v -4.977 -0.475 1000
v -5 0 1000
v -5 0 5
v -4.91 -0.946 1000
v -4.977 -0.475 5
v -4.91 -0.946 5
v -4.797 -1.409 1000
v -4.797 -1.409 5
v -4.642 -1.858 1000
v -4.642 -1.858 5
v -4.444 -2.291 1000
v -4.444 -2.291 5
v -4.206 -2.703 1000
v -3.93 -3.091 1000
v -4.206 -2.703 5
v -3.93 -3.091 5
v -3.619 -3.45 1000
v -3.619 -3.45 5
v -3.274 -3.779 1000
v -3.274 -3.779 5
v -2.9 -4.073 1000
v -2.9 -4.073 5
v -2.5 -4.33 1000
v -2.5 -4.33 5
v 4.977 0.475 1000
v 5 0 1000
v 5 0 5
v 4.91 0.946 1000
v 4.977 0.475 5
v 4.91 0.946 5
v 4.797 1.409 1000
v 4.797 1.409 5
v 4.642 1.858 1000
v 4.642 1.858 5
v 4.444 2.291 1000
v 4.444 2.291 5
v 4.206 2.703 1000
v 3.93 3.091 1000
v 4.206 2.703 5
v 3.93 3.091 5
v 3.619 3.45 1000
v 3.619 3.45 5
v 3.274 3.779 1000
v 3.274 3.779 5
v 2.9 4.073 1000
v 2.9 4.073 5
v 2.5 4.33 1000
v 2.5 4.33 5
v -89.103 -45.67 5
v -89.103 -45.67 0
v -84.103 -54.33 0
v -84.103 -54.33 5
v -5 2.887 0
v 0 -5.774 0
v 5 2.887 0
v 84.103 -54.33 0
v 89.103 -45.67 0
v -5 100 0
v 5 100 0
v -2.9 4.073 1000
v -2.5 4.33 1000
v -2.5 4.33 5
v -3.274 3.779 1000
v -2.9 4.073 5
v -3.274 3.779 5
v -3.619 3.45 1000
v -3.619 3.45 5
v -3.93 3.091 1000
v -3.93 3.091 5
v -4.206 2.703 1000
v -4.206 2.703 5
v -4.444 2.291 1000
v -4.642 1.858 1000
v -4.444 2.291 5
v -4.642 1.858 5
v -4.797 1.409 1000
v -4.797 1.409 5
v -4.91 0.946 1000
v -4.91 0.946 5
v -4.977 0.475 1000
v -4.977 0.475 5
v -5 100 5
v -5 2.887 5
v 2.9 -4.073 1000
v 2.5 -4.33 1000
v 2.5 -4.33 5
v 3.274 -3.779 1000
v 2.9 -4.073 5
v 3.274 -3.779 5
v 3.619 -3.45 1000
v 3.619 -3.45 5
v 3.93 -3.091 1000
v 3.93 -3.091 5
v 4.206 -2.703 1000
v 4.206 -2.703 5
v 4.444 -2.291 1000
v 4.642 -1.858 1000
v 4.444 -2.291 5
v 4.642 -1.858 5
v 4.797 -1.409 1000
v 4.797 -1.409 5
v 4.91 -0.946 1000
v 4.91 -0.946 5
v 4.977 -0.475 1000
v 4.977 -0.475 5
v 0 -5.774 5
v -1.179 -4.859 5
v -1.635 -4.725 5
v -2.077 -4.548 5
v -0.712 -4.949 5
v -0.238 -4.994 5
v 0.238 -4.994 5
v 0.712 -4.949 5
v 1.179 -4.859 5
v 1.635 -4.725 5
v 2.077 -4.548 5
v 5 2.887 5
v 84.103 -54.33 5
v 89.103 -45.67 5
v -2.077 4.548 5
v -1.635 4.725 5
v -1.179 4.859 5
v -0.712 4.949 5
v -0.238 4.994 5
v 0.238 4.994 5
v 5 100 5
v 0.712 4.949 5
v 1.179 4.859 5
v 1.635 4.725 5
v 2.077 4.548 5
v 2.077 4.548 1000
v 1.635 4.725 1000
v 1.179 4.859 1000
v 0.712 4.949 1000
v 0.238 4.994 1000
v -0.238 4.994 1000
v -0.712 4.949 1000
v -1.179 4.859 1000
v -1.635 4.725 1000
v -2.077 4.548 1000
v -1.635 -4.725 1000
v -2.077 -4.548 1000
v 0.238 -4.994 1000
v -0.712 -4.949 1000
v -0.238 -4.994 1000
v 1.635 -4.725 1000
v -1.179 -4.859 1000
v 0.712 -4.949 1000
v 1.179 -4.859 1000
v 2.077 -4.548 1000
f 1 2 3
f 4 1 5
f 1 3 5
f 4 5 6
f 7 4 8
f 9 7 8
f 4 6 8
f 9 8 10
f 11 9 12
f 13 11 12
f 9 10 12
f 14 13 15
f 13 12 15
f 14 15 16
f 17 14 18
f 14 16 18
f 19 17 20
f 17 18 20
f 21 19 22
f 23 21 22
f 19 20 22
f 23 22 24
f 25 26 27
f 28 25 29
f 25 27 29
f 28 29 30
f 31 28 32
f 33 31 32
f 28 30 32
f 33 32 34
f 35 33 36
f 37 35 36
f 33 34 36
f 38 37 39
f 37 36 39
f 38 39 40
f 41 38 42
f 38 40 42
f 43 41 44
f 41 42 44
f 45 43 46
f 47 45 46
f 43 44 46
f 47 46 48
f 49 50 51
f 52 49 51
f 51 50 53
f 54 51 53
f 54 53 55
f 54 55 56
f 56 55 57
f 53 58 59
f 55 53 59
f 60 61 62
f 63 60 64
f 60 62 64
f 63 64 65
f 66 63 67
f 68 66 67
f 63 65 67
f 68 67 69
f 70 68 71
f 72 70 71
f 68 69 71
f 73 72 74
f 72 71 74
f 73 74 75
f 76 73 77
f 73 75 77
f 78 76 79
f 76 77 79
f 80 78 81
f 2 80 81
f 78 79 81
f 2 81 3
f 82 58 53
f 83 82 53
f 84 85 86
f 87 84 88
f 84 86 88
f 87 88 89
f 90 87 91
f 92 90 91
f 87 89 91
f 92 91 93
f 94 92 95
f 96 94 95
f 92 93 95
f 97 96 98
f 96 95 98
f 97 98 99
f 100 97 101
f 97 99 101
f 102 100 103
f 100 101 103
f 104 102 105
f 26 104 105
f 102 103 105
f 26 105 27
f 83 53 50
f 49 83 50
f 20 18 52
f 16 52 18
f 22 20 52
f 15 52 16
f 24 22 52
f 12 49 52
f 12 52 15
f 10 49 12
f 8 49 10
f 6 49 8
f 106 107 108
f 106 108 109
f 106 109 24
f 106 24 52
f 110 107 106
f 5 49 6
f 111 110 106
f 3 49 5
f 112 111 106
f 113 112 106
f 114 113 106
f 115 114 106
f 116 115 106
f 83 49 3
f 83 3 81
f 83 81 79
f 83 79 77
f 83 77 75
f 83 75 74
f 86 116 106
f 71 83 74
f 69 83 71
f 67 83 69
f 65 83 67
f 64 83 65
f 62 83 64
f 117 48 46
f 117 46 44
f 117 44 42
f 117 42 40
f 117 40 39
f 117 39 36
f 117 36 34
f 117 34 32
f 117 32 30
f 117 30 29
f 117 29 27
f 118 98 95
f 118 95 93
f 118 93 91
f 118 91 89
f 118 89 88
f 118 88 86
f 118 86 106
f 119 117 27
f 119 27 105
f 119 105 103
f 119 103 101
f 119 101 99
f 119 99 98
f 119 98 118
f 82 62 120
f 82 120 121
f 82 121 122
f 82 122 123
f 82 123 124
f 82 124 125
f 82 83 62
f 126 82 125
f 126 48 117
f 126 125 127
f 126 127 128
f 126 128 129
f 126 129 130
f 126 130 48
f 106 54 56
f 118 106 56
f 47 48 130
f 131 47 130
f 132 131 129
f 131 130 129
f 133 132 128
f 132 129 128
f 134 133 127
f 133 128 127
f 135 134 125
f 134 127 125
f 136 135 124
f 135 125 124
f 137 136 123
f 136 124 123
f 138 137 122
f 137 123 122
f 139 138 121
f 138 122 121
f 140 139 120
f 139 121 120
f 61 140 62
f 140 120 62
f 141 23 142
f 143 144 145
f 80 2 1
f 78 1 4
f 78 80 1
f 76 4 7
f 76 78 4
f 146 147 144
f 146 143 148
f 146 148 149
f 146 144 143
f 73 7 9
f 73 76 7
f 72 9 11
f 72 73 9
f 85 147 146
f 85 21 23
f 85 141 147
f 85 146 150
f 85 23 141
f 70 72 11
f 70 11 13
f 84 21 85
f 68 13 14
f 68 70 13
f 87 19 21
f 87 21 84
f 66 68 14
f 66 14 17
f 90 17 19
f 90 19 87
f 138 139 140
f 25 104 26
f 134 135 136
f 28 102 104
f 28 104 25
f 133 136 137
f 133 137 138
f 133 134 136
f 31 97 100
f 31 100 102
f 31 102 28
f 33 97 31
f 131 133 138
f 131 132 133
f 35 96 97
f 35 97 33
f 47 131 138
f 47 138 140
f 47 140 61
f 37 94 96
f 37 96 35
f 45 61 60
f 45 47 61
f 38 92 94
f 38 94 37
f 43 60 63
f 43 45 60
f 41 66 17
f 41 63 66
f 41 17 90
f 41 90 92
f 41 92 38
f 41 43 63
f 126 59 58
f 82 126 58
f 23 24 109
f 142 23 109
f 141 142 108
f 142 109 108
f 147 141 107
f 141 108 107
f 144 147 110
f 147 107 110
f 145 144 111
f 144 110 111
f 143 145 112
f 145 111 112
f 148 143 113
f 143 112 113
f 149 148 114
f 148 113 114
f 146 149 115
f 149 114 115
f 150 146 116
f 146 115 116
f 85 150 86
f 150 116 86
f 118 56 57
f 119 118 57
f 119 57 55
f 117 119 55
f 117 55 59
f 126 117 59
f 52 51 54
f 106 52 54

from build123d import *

# Parameters (mm, degrees)
F1_DEPTH = 5
F2_DEPTH = 1000


with BuildPart() as f1:
    # F0 (on Top) → F1 (new body)
    with BuildSketch(Plane.XY):
        with BuildLine():
            Line((-5, 100), (-5, 2.8867513459))
            Line((-5, 2.8867513459), (-2.5, 4.3301270189))
            ThreePointArc((-2.5, 4.3301270189), (0, 5), (2.5, 4.3301270189))
            Line((2.5, 4.3301270189), (5, 2.8867513459))
            Line((5, 2.8867513459), (5, 100))
            Line((5, 100), (-5, 100))
        make_face()
        with BuildLine():
            Line((-2.5, 4.3301270189), (-5, 2.8867513459))
            Line((-5, 2.8867513459), (-5, 0))
            ThreePointArc((-5, 0), (-4.3301270189, 2.5), (-2.5, 4.3301270189))
        make_face()
        with BuildLine():
            Line((-89.1025403784, -45.6698729811), (-86.6025403784, -50))
            Line((-86.6025403784, -50), (-84.1025403784, -54.3301270189))
            Line((-84.1025403784, -54.3301270189), (0, -5.7735026919))
            Line((0, -5.7735026919), (-2.5, -4.3301270189))
            ThreePointArc((-2.5, -4.3301270189), (-4.3301270189, -2.5), (-5, 0))
            Line((-5, 0), (-5, 2.8867513459))
            Line((-5, 2.8867513459), (-89.1025403784, -45.6698729811))
        make_face()
        with BuildLine():
            Line((-2.5, -4.3301270189), (0, -5.7735026919))
            Line((0, -5.7735026919), (2.5, -4.3301270189))
            ThreePointArc((2.5, -4.3301270189), (0, -5), (-2.5, -4.3301270189))
        make_face()
        with BuildLine():
            Line((2.5, -4.3301270189), (0, -5.7735026919))
            Line((0, -5.7735026919), (84.1025403784, -54.3301270189))
            Line((84.1025403784, -54.3301270189), (86.6025403784, -50))
            Line((86.6025403784, -50), (89.1025403784, -45.6698729811))
            Line((89.1025403784, -45.6698729811), (5, 2.8867513459))
            Line((5, 2.8867513459), (5, 0))
            ThreePointArc((5, 0), (4.3301270189, -2.5), (2.5, -4.3301270189))
        make_face()
        with BuildLine():
            Line((5, 2.8867513459), (2.5, 4.3301270189))
            ThreePointArc((2.5, 4.3301270189), (4.3301270189, 2.5), (5, 0))
            Line((5, 0), (5, 2.8867513459))
        make_face()
    extrude(amount=F1_DEPTH)

    # F0 (on Top) → F2 (join)
    with BuildSketch(Plane.XY):
        with BuildLine():
            Line((2.5, 4.3301270189), (0, 0))
            Line((0, 0), (5, 0))
            ThreePointArc((5, 0), (4.3301270189, 2.5), (2.5, 4.3301270189))
        make_face()
        with BuildLine():
            Line((0, 0), (2.5, -4.3301270189))
            ThreePointArc((2.5, -4.3301270189), (4.3301270189, -2.5), (5, 0))
            Line((5, 0), (0, 0))
        make_face()
        with BuildLine():
            ThreePointArc((-2.5, -4.3301270189), (0, -5), (2.5, -4.3301270189))
            Line((2.5, -4.3301270189), (0, 0))
            Line((0, 0), (-2.5, -4.3301270189))
        make_face()
        with BuildLine():
            Line((0, 0), (-5, 0))
            ThreePointArc((-5, 0), (-4.3301270189, -2.5), (-2.5, -4.3301270189))
            Line((-2.5, -4.3301270189), (0, 0))
        make_face()
        with BuildLine():
            Line((0, 0), (-2.5, 4.3301270189))
            ThreePointArc((-2.5, 4.3301270189), (-4.3301270189, 2.5), (-5, 0))
            Line((-5, 0), (0, 0))
        make_face()
        with BuildLine():
            ThreePointArc((2.5, 4.3301270189), (0, 5), (-2.5, 4.3301270189))
            Line((-2.5, 4.3301270189), (0, 0))
            Line((0, 0), (2.5, 4.3301270189))
        make_face()
    extrude(amount=F2_DEPTH)


solid = f1.part
